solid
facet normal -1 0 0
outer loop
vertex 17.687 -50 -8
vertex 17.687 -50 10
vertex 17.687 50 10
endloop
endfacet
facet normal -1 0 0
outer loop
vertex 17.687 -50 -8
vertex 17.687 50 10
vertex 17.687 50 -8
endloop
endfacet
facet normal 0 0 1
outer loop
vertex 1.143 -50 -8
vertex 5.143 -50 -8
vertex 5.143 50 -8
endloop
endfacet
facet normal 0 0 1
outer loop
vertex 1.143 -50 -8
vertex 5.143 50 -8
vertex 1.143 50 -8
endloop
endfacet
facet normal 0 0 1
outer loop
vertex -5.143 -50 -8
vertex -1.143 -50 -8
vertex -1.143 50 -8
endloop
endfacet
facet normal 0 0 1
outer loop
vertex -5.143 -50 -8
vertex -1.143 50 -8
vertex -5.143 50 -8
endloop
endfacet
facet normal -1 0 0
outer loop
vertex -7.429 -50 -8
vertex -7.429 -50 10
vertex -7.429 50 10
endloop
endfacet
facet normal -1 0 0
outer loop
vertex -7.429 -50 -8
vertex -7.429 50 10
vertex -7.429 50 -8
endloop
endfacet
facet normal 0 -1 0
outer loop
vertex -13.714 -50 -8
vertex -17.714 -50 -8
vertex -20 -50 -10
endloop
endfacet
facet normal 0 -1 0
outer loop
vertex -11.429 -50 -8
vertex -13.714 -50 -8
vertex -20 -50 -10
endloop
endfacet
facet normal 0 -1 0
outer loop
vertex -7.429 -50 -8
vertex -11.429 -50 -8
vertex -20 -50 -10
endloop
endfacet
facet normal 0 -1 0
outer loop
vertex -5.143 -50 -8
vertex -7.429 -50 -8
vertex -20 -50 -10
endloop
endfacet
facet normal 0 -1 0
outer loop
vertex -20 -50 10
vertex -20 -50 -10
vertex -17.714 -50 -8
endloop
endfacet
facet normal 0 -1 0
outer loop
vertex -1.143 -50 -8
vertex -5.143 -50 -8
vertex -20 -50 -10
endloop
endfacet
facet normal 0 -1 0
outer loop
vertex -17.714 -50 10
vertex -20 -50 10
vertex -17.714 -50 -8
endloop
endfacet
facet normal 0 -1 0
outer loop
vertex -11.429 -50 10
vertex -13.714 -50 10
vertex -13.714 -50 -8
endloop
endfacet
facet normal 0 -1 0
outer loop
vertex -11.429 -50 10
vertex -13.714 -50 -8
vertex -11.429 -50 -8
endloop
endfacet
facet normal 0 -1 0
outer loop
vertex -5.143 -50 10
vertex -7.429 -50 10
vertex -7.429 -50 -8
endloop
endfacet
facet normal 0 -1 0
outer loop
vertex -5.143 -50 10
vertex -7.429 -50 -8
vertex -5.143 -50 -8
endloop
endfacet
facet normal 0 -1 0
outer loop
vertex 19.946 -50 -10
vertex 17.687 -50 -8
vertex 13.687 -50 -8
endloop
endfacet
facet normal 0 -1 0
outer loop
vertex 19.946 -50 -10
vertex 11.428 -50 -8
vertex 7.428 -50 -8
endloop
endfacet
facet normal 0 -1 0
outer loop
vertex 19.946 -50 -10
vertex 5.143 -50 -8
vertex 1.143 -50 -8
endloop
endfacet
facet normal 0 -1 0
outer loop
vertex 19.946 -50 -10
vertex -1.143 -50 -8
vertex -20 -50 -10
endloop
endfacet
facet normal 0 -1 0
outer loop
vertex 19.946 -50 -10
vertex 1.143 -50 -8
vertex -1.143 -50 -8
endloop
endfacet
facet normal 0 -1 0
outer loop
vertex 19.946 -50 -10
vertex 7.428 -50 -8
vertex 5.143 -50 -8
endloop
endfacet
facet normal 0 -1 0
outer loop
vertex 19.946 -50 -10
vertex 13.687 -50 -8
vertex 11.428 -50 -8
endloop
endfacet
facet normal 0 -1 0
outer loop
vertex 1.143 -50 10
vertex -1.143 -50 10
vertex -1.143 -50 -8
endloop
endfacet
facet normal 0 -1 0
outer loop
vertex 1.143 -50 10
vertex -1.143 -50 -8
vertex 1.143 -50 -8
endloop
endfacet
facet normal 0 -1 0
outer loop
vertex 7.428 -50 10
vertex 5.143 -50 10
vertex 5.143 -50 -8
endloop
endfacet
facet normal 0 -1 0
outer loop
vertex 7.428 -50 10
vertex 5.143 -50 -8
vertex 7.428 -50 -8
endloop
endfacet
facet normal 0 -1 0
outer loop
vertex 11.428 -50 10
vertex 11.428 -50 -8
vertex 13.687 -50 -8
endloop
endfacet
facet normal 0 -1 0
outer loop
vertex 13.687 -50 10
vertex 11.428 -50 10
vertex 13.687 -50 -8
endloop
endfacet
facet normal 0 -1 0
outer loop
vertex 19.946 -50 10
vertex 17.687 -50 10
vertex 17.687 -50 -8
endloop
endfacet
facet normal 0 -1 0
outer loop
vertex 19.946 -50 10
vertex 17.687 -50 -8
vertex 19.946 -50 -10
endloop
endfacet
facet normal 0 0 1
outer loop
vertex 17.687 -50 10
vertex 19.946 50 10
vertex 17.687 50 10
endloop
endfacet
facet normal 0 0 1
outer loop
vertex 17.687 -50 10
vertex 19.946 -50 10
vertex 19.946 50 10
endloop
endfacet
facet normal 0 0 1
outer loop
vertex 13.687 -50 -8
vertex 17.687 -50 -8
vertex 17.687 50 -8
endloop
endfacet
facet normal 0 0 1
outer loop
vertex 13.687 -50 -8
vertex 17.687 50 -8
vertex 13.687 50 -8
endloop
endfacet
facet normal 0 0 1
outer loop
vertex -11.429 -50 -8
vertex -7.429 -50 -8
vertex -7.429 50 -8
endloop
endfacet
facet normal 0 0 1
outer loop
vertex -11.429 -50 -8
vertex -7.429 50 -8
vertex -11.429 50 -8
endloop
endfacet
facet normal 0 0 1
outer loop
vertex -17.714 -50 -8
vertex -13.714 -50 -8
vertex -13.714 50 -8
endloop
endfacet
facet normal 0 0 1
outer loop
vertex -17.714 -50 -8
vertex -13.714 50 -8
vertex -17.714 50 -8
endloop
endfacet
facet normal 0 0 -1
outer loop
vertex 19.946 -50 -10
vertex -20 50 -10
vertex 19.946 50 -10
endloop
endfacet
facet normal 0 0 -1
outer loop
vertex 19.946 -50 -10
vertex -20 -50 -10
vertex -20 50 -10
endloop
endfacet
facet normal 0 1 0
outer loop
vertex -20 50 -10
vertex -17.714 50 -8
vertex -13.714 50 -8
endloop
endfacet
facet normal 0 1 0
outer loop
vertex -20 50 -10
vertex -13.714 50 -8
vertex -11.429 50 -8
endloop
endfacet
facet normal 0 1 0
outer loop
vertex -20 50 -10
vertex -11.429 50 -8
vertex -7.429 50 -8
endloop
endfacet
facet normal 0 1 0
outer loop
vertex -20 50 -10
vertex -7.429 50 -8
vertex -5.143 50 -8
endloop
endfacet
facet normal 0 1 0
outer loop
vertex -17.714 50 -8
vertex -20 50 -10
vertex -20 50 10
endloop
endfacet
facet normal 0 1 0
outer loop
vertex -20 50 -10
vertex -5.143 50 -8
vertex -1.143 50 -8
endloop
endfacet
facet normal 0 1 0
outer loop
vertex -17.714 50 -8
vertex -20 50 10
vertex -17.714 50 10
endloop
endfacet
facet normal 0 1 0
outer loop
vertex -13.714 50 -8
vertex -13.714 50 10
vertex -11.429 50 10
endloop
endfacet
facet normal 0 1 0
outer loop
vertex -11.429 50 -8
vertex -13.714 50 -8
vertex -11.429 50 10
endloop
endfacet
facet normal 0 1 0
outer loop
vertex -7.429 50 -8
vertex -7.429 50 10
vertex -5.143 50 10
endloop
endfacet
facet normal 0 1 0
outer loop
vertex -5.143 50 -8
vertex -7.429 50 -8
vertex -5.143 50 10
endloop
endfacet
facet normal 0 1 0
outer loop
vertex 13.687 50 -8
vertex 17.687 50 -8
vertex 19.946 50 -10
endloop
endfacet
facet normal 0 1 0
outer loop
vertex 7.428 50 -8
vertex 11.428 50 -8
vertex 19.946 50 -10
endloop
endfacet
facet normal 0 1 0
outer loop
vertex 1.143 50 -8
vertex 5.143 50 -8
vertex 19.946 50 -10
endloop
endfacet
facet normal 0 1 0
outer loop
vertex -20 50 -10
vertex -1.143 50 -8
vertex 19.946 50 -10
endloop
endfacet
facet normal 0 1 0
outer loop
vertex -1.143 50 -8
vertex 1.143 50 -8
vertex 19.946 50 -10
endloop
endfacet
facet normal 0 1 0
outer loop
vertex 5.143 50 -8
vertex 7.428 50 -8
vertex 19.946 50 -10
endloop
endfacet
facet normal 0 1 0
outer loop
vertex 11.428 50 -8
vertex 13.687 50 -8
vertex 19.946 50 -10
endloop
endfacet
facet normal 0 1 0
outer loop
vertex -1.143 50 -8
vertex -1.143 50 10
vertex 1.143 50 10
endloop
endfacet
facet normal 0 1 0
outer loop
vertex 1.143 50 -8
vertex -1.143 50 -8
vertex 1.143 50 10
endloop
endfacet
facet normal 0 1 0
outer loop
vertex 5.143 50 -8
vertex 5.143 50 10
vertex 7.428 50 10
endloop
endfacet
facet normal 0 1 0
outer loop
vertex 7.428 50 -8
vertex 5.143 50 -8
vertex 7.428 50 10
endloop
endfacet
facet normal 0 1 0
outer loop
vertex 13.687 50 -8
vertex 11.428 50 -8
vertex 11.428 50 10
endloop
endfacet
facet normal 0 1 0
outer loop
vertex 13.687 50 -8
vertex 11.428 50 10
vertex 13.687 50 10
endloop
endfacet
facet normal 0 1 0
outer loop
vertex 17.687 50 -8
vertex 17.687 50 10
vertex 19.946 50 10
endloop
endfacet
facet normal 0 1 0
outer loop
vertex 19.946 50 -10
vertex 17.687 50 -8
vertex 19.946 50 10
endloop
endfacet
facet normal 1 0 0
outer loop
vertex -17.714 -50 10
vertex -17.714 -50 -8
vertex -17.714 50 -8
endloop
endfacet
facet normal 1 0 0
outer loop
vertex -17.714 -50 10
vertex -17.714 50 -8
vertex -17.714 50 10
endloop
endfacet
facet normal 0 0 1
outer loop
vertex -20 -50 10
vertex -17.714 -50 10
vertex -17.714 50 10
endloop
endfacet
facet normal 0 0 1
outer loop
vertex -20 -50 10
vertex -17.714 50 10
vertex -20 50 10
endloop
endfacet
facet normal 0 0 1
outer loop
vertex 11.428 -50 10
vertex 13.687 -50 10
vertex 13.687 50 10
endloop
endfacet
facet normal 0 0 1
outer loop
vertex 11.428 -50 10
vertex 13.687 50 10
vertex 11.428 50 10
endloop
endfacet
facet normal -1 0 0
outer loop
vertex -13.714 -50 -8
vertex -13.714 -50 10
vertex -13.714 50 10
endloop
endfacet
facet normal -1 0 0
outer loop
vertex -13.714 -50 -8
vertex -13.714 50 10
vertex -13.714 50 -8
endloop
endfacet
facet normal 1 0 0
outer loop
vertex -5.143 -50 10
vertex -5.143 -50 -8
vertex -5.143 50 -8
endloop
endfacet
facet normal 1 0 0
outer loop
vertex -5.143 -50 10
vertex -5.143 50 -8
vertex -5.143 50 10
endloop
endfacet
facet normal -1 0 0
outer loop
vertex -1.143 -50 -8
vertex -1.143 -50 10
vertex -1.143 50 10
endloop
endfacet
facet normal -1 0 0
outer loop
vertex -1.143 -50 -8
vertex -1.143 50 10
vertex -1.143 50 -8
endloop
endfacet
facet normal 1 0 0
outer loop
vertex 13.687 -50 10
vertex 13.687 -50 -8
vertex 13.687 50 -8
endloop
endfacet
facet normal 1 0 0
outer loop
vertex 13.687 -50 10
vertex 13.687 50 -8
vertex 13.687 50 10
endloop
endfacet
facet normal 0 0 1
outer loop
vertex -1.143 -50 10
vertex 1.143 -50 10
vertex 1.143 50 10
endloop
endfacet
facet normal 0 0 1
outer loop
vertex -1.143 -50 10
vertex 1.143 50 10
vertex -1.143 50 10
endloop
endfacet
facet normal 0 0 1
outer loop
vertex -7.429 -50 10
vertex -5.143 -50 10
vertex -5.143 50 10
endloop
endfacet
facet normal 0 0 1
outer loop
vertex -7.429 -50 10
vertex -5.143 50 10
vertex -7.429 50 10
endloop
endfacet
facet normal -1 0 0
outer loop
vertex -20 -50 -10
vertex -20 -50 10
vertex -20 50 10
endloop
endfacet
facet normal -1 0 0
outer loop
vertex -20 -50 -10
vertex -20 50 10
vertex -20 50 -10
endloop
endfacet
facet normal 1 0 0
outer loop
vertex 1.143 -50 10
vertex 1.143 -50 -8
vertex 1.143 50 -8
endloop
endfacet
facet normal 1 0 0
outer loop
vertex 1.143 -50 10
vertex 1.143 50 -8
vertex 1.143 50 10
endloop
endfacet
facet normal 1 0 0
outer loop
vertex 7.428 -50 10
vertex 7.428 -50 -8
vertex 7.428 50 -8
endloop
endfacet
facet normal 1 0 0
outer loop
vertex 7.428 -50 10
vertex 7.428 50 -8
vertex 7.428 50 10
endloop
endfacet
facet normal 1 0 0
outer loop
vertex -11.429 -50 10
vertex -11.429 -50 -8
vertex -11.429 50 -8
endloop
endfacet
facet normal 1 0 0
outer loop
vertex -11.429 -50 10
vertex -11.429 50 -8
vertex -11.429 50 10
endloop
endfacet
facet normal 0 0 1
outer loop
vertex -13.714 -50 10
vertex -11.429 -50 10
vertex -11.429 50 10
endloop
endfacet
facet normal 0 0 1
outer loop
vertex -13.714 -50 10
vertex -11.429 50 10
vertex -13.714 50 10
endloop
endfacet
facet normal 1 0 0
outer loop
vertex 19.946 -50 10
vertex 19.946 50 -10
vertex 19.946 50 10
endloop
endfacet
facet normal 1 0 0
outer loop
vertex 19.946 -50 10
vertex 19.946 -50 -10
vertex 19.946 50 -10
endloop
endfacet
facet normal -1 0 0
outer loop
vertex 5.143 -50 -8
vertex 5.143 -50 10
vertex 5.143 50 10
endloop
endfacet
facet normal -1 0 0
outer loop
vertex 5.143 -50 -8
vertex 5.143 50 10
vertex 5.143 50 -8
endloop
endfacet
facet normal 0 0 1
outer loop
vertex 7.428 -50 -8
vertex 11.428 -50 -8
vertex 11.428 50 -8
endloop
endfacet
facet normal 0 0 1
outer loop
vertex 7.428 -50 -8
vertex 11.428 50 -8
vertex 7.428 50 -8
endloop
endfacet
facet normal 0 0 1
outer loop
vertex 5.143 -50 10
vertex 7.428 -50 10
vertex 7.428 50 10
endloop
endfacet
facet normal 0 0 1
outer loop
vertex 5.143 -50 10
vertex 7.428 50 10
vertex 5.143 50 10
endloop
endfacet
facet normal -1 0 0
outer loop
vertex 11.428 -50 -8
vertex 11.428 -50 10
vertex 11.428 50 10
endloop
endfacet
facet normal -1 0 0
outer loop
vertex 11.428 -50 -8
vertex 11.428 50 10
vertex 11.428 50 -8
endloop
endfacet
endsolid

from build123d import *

# Parameters (mm, degrees)
F1_DEPTH = 50


with BuildPart() as f1:
    # F0 (on Front) → F1 (new body, symmetric)
    with BuildSketch(Plane.XZ):
        Polygon((19.9459, -8), (19.9459, 10), (17.6872, 10), (17.6872, -8), (13.6872, -8), (13.6872, 10), (11.4285, 10), (11.4285, -8), (7.4285, -8), (7.4285, 10), (5.1428, 10), (5.1428, -8), (1.1428, -8), (1.1428, 10), (-1.1429, 10), (-1.1429, -8), (-5.1429, -8), (-5.1429, 10), (-7.4286, 10), (-7.4286, -8), (-11.4286, -8), (-11.4286, 10), (-13.7143, 10), (-13.7143, -8), (-17.7143, -8), (-17.7143, 10), (-20, 10), (-20, -10), (19.9459, -10), align=None)
    extrude(amount=F1_DEPTH, both=True)


solid = f1.part
